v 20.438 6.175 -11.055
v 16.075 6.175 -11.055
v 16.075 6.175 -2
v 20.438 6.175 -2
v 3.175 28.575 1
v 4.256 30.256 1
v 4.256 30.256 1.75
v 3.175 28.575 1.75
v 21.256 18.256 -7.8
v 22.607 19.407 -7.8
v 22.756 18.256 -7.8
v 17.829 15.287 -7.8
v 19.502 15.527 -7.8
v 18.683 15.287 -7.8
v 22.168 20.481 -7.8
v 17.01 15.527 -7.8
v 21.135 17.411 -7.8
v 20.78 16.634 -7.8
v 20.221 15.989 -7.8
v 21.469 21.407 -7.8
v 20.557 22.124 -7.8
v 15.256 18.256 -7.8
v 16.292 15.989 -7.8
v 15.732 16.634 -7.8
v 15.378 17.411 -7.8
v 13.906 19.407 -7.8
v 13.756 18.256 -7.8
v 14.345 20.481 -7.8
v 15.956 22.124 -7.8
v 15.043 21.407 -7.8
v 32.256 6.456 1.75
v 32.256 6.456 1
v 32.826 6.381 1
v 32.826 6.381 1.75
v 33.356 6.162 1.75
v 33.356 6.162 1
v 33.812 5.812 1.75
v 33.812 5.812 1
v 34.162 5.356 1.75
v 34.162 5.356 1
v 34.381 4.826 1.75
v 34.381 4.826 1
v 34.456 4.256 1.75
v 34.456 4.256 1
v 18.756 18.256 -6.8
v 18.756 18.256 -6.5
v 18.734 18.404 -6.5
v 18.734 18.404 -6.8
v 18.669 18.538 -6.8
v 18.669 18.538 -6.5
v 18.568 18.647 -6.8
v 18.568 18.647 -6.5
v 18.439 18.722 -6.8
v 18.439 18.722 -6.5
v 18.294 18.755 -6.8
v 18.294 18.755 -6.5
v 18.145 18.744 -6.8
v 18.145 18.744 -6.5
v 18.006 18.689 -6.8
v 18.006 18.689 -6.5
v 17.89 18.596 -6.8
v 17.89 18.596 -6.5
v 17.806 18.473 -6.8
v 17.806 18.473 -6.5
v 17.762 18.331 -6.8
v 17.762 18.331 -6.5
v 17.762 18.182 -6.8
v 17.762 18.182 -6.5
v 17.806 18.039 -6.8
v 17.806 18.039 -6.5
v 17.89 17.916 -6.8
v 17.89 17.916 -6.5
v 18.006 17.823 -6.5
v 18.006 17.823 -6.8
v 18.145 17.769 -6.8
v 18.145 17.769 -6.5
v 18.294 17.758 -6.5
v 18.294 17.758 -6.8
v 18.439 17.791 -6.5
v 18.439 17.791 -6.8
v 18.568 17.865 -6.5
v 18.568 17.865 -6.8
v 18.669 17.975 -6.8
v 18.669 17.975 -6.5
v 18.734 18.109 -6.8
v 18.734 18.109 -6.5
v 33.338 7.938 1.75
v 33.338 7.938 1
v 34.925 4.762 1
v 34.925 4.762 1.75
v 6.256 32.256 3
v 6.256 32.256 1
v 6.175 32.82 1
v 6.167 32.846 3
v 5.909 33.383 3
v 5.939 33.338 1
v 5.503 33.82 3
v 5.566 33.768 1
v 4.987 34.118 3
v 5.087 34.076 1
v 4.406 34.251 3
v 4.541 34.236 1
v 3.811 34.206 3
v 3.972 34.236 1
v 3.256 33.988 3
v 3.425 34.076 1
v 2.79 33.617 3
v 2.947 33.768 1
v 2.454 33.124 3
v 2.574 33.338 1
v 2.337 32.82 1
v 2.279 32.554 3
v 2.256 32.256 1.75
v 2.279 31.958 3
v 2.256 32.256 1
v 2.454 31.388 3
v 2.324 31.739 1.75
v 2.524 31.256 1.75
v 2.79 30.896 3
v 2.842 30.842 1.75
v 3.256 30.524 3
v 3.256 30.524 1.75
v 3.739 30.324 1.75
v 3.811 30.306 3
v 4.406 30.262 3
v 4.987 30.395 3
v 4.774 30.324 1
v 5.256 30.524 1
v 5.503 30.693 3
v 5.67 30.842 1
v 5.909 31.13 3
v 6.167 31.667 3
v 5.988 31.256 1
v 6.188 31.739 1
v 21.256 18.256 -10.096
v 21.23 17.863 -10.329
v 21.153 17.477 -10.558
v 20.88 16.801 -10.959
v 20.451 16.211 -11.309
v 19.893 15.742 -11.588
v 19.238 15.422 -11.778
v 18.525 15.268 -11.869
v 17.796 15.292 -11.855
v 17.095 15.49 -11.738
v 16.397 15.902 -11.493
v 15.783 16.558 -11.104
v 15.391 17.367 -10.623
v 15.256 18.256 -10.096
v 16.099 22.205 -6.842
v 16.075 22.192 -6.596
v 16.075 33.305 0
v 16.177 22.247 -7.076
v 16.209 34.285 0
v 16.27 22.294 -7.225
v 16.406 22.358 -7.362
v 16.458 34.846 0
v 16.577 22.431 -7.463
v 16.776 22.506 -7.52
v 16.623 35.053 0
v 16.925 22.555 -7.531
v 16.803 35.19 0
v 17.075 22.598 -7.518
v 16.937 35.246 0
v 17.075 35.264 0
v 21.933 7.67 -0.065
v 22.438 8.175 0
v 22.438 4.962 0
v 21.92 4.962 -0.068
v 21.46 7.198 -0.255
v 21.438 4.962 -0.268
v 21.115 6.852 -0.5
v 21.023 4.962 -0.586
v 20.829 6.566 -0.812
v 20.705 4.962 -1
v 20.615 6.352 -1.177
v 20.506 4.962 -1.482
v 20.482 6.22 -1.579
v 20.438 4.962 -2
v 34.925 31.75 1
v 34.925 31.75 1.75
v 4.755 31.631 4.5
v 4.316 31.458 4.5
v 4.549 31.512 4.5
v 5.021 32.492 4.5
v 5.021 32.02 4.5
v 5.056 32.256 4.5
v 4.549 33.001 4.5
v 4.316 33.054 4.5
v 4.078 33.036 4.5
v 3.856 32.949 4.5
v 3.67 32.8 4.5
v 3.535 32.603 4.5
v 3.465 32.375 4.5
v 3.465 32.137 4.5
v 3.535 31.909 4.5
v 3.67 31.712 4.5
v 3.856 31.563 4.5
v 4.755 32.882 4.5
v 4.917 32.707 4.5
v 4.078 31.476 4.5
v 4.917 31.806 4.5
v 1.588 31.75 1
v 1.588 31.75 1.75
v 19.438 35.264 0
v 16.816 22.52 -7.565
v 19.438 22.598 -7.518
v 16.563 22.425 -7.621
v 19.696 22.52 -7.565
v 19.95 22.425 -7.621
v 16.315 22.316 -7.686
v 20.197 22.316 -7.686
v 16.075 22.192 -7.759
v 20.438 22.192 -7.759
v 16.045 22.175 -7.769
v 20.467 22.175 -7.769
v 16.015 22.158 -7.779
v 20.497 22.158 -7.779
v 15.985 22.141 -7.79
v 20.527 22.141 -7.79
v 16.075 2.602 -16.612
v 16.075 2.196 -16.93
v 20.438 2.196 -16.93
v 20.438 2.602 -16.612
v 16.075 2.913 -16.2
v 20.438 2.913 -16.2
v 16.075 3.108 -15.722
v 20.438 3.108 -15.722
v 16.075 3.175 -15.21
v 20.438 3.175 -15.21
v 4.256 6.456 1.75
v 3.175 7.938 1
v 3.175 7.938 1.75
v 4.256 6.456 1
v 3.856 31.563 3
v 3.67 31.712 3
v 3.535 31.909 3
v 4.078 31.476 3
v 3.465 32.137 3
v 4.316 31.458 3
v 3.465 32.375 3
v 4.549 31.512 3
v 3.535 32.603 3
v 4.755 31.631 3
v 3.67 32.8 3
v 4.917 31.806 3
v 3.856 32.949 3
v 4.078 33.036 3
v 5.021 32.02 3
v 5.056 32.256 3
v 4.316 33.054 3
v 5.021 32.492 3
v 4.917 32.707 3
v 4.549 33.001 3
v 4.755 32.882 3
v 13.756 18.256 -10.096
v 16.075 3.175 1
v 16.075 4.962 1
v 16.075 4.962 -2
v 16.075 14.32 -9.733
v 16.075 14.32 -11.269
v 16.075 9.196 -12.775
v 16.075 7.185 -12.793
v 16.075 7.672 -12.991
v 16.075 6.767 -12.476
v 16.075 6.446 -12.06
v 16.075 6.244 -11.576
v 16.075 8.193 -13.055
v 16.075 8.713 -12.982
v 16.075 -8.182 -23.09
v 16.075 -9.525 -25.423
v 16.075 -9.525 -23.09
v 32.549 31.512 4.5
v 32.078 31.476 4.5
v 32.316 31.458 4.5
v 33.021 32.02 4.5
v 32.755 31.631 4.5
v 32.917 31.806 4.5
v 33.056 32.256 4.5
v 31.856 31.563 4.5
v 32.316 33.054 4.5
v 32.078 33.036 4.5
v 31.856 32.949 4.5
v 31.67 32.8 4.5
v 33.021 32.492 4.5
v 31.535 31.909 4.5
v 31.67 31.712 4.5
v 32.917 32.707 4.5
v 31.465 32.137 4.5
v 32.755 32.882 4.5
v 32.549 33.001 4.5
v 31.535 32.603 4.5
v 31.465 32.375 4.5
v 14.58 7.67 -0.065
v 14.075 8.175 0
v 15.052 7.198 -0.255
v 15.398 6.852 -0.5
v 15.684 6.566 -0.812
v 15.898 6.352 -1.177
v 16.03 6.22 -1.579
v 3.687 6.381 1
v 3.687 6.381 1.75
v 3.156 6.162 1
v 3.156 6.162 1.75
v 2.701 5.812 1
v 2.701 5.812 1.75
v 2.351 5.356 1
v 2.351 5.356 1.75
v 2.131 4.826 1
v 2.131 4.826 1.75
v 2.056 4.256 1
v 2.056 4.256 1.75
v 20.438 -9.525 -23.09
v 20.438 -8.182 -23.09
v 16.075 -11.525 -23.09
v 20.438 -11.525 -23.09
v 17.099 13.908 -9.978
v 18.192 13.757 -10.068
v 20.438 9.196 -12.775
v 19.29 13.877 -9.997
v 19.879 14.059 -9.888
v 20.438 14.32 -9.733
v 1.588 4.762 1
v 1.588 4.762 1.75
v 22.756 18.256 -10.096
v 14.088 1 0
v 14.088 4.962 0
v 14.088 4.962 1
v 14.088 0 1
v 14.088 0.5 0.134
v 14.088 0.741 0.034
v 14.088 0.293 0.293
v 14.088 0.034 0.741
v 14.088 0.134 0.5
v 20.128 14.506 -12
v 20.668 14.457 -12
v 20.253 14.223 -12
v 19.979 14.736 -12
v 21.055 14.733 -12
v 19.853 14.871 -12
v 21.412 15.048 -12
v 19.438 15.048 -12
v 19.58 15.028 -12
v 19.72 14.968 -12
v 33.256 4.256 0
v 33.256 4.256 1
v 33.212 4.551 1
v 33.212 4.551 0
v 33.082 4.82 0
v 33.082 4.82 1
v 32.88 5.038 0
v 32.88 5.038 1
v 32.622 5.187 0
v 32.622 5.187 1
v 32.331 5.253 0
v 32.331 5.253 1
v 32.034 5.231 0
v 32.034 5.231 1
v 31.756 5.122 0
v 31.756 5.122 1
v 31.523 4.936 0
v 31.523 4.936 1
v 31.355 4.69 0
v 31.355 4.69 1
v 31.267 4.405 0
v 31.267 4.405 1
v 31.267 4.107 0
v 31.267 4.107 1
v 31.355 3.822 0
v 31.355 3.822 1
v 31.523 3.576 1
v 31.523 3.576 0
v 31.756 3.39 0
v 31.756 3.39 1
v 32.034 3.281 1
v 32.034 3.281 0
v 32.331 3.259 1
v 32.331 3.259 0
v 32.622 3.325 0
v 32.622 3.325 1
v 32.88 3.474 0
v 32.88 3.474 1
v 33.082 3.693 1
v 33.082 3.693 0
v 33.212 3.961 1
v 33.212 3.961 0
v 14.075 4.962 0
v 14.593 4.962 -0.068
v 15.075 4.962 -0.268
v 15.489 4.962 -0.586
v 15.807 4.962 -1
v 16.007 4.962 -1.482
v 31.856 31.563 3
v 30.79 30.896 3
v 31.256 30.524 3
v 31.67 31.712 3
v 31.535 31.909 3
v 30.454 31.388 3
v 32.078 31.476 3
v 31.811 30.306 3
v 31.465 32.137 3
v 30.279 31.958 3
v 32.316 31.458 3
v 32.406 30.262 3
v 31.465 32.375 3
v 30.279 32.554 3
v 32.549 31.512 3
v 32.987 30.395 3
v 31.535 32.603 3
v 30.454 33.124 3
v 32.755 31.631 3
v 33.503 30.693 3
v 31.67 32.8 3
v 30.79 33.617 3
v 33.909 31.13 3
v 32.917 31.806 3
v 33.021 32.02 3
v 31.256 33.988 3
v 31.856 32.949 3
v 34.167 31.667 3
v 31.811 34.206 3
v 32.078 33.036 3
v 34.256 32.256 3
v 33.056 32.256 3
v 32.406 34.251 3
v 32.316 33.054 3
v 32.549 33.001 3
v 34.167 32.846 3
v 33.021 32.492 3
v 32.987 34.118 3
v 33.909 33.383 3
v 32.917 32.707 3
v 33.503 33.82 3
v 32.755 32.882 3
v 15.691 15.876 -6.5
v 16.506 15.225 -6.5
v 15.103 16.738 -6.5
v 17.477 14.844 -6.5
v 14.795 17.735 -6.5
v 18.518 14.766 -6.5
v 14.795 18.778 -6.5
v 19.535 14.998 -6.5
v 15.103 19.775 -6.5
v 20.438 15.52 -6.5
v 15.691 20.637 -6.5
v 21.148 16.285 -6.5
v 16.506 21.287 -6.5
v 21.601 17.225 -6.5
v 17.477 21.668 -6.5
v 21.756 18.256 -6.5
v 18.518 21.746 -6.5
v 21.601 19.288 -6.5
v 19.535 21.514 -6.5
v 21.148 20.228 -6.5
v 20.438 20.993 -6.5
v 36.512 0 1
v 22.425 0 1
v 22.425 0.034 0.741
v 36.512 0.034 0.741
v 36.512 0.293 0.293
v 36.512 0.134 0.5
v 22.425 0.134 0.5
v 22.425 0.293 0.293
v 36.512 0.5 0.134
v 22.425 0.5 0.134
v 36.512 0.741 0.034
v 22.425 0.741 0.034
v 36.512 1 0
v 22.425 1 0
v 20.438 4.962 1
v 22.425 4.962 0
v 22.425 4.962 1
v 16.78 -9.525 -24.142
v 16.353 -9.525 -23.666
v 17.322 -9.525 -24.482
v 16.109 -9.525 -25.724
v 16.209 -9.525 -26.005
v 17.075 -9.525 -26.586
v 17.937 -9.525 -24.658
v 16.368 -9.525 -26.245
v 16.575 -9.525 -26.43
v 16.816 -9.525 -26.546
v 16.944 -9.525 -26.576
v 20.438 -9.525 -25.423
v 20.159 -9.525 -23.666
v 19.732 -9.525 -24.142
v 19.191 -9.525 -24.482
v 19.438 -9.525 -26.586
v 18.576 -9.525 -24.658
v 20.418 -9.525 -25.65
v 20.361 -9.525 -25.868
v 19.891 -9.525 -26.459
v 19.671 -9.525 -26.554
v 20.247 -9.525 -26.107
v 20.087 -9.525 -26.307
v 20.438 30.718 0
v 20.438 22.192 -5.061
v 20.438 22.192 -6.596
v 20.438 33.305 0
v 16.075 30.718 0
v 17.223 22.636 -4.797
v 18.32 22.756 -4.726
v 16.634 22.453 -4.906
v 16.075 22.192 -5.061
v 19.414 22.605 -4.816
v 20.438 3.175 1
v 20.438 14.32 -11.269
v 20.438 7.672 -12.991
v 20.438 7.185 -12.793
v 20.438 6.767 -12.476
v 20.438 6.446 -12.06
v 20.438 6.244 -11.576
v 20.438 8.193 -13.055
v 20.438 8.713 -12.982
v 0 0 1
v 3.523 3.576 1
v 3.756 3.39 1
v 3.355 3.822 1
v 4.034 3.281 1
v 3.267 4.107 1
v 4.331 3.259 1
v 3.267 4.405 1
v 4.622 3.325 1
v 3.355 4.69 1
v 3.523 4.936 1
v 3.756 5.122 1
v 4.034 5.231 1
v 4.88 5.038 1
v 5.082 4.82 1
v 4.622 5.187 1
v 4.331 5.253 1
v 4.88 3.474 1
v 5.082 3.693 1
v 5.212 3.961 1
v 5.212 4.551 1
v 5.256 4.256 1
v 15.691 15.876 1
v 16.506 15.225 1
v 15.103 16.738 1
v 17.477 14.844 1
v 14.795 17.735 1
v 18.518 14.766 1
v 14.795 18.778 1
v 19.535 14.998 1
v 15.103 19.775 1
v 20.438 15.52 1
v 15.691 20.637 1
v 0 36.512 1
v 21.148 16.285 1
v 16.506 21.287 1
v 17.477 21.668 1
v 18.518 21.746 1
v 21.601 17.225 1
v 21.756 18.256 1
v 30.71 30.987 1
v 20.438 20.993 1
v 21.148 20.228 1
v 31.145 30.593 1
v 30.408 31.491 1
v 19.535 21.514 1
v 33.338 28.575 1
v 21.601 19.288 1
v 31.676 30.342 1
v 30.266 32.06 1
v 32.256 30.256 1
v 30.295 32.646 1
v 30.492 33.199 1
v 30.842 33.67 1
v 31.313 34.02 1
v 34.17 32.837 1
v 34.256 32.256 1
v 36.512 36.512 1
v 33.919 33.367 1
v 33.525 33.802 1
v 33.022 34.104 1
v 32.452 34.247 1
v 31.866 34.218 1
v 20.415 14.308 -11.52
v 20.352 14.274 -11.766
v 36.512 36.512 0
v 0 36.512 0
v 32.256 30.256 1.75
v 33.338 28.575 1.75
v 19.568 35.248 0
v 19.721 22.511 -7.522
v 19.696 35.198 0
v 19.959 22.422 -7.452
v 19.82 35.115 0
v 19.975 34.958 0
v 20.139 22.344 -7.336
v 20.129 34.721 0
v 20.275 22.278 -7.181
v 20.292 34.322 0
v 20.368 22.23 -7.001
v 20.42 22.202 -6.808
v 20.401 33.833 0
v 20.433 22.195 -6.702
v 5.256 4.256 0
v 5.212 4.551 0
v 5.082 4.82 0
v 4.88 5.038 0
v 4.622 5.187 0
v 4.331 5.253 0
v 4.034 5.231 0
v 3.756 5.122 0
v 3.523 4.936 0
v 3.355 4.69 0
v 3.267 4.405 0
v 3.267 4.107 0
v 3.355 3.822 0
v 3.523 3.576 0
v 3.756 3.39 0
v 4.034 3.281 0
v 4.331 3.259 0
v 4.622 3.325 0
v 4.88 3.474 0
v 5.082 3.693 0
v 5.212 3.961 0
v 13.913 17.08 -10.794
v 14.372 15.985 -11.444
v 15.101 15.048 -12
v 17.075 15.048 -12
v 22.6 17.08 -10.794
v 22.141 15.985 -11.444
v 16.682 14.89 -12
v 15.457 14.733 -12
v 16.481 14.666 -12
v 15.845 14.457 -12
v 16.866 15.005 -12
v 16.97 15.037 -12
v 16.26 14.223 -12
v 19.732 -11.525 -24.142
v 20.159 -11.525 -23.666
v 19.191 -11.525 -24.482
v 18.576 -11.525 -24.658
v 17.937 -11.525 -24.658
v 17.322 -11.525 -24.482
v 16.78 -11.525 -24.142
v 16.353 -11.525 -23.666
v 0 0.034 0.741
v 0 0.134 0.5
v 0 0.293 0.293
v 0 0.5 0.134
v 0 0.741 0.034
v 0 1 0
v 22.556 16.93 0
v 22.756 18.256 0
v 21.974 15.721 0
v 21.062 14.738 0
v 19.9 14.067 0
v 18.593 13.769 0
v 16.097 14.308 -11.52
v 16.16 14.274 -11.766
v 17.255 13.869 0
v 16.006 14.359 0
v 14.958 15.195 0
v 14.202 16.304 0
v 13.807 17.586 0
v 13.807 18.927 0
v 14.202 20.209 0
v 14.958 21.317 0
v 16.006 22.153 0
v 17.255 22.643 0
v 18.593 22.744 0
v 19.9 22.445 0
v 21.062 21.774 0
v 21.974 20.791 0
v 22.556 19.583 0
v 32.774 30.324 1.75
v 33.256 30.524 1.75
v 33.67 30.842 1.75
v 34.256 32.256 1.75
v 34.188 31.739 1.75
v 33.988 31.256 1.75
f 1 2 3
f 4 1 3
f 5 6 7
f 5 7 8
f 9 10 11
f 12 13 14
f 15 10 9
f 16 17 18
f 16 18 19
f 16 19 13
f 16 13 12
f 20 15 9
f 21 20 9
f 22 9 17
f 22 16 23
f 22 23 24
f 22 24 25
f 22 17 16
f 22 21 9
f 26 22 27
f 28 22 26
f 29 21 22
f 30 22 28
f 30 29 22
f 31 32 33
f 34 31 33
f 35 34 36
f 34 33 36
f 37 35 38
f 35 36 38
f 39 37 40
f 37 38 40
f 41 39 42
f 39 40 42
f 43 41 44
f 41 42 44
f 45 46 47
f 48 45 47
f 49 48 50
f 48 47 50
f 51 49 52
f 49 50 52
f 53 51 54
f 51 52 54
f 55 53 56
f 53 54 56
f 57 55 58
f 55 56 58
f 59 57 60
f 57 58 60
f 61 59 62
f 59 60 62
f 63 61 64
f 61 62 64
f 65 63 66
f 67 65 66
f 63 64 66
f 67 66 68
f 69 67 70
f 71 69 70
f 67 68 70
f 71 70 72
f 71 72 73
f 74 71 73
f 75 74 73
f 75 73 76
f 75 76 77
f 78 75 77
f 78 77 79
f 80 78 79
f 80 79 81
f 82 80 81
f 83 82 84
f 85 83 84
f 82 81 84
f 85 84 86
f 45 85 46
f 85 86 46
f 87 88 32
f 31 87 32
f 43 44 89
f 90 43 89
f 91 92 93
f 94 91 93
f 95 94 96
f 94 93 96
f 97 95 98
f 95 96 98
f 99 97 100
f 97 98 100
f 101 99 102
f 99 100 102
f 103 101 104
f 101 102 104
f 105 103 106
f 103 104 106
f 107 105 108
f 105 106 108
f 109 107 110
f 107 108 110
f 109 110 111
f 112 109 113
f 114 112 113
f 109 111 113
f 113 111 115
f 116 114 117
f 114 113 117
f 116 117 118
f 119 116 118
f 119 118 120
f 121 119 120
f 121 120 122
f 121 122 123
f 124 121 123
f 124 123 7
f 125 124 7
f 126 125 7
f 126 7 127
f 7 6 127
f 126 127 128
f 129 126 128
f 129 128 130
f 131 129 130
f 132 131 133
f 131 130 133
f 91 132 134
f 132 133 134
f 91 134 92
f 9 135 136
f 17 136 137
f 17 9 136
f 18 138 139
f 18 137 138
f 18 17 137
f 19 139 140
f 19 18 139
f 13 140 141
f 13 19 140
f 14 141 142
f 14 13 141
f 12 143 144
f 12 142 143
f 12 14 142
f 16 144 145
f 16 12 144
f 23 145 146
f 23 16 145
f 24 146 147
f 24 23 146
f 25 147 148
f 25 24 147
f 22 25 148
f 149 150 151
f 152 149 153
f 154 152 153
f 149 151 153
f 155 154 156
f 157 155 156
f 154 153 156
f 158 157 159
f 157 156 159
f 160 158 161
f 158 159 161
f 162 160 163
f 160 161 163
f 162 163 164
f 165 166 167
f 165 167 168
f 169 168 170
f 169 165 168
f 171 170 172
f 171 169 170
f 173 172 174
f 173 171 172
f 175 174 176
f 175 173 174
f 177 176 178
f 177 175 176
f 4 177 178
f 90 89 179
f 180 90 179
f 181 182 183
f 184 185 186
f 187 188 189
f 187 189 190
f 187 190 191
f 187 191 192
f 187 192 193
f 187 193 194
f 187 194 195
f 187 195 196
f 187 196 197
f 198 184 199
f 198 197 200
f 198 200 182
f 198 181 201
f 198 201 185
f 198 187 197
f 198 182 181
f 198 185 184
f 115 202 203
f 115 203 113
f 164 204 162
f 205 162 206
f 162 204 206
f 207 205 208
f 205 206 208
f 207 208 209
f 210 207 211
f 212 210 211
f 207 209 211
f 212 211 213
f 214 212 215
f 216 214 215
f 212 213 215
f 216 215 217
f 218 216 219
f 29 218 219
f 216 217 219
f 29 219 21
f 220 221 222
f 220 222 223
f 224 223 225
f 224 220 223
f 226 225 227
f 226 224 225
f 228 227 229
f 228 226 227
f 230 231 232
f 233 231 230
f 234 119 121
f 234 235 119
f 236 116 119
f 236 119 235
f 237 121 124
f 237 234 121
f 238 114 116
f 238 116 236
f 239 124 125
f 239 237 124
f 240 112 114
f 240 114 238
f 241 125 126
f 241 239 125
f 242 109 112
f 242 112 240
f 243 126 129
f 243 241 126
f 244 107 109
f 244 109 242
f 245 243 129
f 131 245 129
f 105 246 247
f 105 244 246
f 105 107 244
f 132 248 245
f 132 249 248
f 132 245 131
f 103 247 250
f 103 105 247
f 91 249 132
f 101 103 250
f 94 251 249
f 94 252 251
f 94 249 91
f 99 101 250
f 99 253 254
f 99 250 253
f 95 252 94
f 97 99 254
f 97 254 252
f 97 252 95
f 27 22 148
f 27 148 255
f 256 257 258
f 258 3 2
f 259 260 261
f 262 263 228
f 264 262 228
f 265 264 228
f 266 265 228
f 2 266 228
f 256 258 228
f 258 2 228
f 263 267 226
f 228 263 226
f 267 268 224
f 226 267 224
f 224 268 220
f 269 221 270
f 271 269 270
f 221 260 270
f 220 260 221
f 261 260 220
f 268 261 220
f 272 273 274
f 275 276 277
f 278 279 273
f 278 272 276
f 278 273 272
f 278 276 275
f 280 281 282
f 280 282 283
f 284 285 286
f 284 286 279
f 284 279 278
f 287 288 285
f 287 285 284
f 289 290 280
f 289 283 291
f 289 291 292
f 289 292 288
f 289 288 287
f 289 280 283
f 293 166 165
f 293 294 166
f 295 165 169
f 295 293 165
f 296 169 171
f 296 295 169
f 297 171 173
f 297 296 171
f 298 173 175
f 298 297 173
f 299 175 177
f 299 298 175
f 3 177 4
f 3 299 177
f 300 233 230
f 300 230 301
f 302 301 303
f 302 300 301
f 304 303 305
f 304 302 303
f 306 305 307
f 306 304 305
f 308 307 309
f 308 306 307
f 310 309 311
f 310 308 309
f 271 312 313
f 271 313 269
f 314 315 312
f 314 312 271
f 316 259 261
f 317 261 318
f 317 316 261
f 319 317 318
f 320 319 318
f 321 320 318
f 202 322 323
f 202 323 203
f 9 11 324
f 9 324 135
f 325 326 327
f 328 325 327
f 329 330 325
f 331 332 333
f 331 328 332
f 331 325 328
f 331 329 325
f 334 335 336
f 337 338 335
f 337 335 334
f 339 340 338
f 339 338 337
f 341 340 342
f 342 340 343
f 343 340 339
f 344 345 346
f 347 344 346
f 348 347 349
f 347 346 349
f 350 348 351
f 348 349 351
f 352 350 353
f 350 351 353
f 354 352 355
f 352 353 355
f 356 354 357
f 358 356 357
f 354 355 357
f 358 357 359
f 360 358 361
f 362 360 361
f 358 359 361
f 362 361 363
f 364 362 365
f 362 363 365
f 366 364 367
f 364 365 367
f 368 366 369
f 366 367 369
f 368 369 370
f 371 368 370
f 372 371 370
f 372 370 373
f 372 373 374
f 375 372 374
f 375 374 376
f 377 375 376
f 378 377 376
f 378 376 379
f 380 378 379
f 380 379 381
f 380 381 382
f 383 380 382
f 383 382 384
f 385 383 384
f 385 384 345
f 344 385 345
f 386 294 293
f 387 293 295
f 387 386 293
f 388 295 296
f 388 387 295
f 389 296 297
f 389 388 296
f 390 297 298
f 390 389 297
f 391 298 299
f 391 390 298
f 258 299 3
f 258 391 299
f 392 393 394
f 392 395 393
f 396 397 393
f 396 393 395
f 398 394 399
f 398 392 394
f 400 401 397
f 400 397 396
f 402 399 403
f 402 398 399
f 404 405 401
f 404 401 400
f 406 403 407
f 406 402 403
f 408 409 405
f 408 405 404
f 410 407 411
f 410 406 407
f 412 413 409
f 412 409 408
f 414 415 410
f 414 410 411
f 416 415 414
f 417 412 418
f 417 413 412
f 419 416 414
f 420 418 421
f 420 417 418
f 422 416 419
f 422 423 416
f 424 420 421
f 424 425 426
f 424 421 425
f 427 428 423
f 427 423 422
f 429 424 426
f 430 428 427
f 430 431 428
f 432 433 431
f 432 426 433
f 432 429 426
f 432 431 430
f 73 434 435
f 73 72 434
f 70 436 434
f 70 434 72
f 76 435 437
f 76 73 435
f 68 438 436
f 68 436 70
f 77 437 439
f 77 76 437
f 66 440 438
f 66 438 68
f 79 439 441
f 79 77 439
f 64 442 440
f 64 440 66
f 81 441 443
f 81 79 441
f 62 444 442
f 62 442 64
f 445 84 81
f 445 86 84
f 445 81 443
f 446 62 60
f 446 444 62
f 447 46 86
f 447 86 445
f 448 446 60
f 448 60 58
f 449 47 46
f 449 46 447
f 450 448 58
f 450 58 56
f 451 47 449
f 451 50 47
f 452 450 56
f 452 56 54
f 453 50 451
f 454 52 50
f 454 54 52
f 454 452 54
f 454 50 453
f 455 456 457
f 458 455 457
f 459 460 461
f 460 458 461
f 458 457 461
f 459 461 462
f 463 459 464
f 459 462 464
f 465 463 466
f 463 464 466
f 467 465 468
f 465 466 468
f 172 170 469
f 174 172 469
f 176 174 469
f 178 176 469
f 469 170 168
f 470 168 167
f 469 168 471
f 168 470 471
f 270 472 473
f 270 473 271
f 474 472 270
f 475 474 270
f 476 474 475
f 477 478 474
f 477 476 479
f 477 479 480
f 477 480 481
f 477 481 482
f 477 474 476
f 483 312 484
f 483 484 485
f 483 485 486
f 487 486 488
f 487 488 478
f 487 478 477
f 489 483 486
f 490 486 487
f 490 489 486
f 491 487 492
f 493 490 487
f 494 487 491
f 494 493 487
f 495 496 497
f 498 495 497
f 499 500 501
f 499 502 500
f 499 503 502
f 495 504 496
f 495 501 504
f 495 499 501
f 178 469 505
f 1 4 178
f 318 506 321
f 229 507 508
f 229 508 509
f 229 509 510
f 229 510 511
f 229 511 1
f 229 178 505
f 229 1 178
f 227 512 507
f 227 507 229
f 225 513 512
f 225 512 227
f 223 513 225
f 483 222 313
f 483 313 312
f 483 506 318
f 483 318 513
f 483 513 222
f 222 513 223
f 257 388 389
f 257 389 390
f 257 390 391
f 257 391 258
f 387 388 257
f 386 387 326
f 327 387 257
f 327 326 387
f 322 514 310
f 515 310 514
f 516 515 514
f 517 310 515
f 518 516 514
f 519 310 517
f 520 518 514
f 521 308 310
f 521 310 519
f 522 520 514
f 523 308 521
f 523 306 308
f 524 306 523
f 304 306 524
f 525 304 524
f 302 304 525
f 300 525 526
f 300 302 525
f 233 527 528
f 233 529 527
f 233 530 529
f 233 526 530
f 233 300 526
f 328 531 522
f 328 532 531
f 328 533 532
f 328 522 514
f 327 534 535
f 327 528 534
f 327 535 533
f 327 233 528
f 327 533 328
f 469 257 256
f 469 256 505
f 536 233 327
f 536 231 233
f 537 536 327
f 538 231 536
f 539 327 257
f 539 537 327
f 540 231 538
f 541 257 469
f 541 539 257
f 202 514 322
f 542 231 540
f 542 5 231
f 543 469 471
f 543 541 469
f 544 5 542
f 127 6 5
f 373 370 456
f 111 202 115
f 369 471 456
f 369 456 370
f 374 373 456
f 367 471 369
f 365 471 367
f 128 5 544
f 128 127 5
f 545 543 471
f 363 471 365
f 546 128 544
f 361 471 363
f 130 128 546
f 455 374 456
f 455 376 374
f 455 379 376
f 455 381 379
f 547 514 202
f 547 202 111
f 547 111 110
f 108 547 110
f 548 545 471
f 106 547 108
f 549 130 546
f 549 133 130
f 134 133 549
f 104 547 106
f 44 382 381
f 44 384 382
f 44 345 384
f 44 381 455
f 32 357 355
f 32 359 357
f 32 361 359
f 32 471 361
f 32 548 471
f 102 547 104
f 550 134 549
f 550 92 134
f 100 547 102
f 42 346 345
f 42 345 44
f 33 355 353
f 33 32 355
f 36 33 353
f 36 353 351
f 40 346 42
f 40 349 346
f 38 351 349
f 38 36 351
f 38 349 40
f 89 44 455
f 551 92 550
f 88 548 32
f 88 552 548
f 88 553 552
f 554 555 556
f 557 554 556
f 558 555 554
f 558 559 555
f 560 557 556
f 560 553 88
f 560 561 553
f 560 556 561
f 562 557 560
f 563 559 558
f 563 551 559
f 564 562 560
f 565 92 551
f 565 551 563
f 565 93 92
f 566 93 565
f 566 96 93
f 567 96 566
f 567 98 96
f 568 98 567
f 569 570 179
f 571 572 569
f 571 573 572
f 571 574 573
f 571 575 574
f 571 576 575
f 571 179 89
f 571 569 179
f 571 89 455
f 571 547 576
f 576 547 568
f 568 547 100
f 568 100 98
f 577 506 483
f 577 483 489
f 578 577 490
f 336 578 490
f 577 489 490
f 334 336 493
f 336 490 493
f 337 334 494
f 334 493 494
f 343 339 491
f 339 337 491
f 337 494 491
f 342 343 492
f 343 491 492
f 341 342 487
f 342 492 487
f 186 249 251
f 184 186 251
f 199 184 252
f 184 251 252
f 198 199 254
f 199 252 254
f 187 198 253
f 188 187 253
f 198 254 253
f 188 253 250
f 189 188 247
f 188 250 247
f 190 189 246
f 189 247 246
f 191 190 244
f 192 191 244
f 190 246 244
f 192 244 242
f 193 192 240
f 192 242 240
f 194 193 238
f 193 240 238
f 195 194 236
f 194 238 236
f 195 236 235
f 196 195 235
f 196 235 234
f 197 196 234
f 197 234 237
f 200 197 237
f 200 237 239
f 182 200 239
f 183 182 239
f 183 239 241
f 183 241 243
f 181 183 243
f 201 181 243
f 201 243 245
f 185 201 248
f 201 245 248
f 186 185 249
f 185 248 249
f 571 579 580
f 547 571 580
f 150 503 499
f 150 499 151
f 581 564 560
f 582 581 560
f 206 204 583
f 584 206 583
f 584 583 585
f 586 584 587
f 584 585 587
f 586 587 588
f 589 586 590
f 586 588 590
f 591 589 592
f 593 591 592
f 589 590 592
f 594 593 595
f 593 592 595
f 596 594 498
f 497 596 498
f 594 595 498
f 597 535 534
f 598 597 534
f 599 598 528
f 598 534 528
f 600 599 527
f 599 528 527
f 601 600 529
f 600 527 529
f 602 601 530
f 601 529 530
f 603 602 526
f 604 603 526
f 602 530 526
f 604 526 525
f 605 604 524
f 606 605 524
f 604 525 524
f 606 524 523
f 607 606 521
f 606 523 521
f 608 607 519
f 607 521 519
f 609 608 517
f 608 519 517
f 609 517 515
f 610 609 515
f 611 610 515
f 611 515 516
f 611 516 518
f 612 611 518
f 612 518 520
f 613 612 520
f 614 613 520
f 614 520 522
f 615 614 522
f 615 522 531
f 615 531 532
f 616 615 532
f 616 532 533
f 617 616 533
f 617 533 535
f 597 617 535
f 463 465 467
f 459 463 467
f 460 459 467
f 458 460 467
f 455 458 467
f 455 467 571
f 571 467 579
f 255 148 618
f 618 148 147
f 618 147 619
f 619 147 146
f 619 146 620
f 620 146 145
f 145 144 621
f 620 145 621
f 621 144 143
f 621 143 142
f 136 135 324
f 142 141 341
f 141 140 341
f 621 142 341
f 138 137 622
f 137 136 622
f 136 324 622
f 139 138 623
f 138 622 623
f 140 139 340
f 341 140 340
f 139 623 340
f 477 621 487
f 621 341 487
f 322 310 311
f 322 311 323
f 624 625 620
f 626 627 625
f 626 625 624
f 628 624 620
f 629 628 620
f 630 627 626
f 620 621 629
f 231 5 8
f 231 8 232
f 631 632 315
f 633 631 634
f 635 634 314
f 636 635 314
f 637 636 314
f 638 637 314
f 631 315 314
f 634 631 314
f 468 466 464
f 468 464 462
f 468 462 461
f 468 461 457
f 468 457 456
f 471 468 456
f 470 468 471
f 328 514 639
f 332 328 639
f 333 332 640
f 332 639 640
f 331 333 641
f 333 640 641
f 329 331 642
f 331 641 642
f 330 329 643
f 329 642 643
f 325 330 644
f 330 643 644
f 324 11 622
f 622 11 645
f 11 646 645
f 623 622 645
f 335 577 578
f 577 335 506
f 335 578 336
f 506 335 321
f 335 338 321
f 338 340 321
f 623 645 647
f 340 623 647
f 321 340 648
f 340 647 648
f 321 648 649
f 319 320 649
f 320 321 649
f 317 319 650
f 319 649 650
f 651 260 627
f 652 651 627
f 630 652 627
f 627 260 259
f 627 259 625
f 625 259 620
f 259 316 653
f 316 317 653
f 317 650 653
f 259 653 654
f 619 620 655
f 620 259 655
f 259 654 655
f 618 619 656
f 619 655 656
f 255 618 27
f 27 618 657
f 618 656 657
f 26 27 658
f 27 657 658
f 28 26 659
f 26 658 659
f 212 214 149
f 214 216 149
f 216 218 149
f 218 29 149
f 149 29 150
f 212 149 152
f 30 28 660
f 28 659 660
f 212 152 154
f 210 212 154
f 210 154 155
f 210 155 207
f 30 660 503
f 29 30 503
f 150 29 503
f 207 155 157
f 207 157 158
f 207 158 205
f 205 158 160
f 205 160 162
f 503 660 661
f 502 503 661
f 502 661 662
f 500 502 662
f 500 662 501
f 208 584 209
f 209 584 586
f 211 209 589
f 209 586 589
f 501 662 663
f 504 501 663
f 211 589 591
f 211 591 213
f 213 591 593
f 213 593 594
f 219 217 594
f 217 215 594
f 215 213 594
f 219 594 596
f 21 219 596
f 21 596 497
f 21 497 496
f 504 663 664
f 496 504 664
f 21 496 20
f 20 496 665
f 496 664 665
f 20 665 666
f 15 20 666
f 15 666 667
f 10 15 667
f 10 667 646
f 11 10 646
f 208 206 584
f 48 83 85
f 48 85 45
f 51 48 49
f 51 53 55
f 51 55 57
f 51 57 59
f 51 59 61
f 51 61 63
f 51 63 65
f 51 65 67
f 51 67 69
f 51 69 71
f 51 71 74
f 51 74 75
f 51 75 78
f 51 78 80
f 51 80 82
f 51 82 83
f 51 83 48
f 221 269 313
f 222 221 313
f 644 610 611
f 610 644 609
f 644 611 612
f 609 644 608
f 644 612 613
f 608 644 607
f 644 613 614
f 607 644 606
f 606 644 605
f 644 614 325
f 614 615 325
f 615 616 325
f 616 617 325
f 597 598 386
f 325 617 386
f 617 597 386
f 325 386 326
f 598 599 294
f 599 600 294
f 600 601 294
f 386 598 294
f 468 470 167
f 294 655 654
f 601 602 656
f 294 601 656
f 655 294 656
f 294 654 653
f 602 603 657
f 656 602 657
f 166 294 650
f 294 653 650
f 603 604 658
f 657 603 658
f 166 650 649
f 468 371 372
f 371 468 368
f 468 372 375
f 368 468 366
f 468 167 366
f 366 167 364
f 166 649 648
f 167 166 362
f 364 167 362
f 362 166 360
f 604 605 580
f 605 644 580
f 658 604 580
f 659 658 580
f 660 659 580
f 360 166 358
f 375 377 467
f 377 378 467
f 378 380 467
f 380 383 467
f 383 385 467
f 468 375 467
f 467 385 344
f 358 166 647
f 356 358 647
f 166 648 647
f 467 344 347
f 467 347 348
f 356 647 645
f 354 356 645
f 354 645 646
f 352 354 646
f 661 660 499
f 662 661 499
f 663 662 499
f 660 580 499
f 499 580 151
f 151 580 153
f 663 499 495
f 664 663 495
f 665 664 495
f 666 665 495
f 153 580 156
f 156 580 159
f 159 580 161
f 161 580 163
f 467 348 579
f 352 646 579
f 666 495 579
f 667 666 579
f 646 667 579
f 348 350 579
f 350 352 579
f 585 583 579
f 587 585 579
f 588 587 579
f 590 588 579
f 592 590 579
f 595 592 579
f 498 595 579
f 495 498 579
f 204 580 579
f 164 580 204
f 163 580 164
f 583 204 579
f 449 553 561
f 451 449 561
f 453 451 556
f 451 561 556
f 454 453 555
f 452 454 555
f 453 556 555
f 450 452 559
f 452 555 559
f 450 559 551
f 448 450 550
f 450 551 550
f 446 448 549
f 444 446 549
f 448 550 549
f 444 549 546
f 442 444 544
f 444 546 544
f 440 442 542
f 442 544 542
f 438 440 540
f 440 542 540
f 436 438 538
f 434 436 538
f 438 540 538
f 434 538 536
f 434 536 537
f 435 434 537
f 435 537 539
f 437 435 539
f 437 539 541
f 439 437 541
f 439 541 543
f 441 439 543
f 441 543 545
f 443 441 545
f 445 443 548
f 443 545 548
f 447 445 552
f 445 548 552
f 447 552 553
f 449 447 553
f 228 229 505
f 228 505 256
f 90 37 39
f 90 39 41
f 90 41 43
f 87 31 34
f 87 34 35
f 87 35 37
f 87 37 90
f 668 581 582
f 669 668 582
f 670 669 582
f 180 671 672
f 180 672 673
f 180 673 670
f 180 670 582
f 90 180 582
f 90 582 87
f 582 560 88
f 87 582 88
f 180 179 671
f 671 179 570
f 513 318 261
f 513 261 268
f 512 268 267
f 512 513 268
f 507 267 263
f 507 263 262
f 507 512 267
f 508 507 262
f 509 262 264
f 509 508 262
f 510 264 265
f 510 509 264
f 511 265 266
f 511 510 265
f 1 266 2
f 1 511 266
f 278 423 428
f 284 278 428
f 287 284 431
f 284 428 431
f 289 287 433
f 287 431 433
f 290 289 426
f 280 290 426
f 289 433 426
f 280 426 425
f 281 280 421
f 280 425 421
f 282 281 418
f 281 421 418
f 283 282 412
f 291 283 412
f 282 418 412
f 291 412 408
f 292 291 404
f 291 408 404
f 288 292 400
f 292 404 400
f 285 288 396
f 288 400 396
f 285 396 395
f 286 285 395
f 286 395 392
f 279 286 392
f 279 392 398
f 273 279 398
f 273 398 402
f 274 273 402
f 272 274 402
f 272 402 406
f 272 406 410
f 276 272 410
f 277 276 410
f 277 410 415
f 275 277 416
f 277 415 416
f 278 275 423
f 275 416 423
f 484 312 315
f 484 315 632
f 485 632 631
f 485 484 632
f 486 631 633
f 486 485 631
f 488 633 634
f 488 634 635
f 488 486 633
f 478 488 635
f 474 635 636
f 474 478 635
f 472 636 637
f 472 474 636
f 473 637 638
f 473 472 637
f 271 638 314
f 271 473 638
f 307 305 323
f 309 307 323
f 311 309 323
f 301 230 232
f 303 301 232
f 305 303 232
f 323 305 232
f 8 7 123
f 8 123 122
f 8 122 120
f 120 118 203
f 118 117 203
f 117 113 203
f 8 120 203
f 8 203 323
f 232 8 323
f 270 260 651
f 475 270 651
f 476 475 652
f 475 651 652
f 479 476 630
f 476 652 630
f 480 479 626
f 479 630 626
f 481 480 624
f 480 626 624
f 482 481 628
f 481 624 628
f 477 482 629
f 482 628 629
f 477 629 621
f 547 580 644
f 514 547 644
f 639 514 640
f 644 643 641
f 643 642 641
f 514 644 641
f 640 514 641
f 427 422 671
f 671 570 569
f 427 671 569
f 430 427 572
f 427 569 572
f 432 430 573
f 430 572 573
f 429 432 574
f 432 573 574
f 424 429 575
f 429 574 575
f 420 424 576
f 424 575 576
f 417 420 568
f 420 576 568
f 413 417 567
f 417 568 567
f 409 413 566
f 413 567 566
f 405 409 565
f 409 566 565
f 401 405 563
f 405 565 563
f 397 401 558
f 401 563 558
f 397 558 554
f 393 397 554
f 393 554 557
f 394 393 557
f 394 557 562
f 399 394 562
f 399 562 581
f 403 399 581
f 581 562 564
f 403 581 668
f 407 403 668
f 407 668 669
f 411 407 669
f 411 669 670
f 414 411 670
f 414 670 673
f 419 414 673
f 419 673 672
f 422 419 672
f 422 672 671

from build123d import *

# Parameters (mm, degrees)
EXTRUDE1_DEPTH       = 1
SKETCH2_R            = 2.0000000000000036
SKETCH2_R_2          = 2.000000000000001
EXTRUDE2_DEPTH       = 2
EXTRUDE3_DEPTH       = 0.75
SKETCH4_R            = 0.9999999999999981
SKETCH4_R_2          = 0.9999999999999998
EXTRUDE4_DEPTH       = 52.67519049311769
SKETCH5_R            = 0.800000000000003
SKETCH5_R_2          = 0.8000000000000015
EXTRUDE5_DEPTH       = 1.5
EXTRUDE6_DEPTH       = 52.83218413785011
SKETCH7_W            = 4.362500000000001
SKETCH7_H            = 3.0000000000000013
EXTRUDE7_DEPTH       = 19
EXTRUDE8_DEPTH       = 46.95491336625498
EXTRUDE9_DEPTH       = 17
EXTRUDE9_DEPTH_BACK  = 36
SKETCH9_W            = 4.362500000000001
SKETCH9_H            = 2.3206120824820307
SKETCH10_W           = 6.349999999999998
SKETCH10_H           = 3.475000000000003
EXTRUDE10_DEPTH      = 50.80993243420719
SKETCH11_R           = 4.500000000000002
EXTRUDE11_DEPTH      = 12
EXTRUDE12_START      = -4.2
EXTRUDE12_DEPTH      = 4.2
EXTRUDE13_DEPTH      = 4.5
EXTRUDE13_DEPTH_BACK = 50.57488155832686
SKETCH15_R           = 3.4999999999999996
EXTRUDE14_DEPTH      = 7.5
SKETCH16_R           = 0.49999999999999917
EXTRUDE15_DEPTH      = 0.3
EXTRUDE16_DEPTH      = 2
EXTRUDE17_DEPTH      = 5
EXTRUDE18_DEPTH      = 50.574881558326865
FILLET2_R            = 1
FILLET3_R            = 2
EXTRUDE19_DEPTH      = 4.3625


with BuildPart() as part:
    # Sketch1 → Extrude1 (new body)
    with BuildSketch(Plane.XY):
        Polygon((0, 0), (36.5125, 0), (36.512499999999996, 36.512499999999996), (0, 36.5125), align=None)
    extrude(amount=EXTRUDE1_DEPTH)

    # Sketch2 → Extrude2 (add)
    with BuildSketch(Plane.XY.offset(1)):
        with Locations((32.25625, 32.25625)):
            Circle(SKETCH2_R)
        with Locations((4.25625, 32.25625)):
            Circle(SKETCH2_R_2)
    extrude(amount=EXTRUDE2_DEPTH)

    # Sketch3 → Extrude3 (add)
    with BuildSketch(Plane.XY.offset(1)):
        with BuildLine():
            Line((1.5875, 4.762499999999999), (1.5875, 31.75))
            Line((1.5875, 31.75), (2.256249999999998, 32.25625))
            Line((2.256249999999998, 32.25625), (4.25625, 30.256249999999998))
            Line((4.25625, 30.256249999999998), (3.175, 28.575))
            Line((3.175, 28.575), (3.175, 7.9375))
            Line((3.175, 7.9375), (4.256250000000003, 6.456250000000007))
            ThreePointArc((4.256250000000003, 6.456250000000007), (2.7006150813895986, 5.811884918610412), (2.0562500000000026, 4.256250000000007))
            Line((2.0562500000000026, 4.256250000000007), (1.5875, 4.762499999999999))
        make_face()
        with BuildLine():
            Line((34.925, 4.762499999999999), (34.925, 31.75))
            Line((34.925, 31.75), (34.25625, 32.25625))
            Line((34.25625, 32.25625), (32.25625, 30.256249999999998))
            Line((32.25625, 30.256249999999998), (33.3375, 28.575))
            Line((33.3375, 28.575), (33.3375, 7.9375))
            Line((33.3375, 7.9375), (32.25625000000001, 6.456249999999997))
            ThreePointArc((32.25625000000001, 6.456249999999997), (33.81188491861041, 5.811884918610402), (34.456250000000004, 4.256249999999998))
            Line((34.456250000000004, 4.256249999999998), (34.925, 4.762499999999999))
        make_face()
    extrude(amount=EXTRUDE3_DEPTH)

    # Sketch4 → Extrude4 (cut, through all)
    with BuildSketch(Plane.XY.offset(1)):
        with Locations((32.25625, 4.256249999999997)):
            Circle(SKETCH4_R)
        with Locations((4.256250000000007, 4.256250000000004)):
            Circle(SKETCH4_R_2)
    extrude(amount=-EXTRUDE4_DEPTH, mode=Mode.SUBTRACT)

    # Sketch5 → Extrude5 (add)
    with BuildSketch(Plane.XY.offset(3)):
        with Locations((32.25625, 32.25625)):
            Circle(SKETCH5_R)
        with Locations((4.25625, 32.25625)):
            Circle(SKETCH5_R_2)
    extrude(amount=EXTRUDE5_DEPTH)

    # Sketch6 → Extrude6 (cut, through all)
    with BuildSketch(Plane(origin=(0, 0, 0), x_dir=(-1, 0, 0), z_dir=(0, 0, -1))):
        Polygon((-22.425, 0), (-22.425, 4.9625), (-20.4375, 4.9625), (-20.4375, 3.175), (-16.075, 3.175), (-16.075, 4.9625), (-14.0875, 4.9625), (-14.0875, 0), align=None)
    extrude(amount=-EXTRUDE6_DEPTH, mode=Mode.SUBTRACT)

    # Sketch7 → Extrude7 (add)
    with BuildSketch(Plane(origin=(0, 0, 0), x_dir=(-1, 0, 0), z_dir=(0, 0, -1))):
        with Locations((-18.25625, 4.675)):
            Rectangle(SKETCH7_W, SKETCH7_H)
    extrude(amount=EXTRUDE7_DEPTH)

    # Sketch8 → Extrude8 (cut, through all)
    with BuildSketch(Plane(origin=(20.4375, 0, 0), x_dir=(0, 0, -1), z_dir=(1, 0, 0))):
        Polygon((19, 4.748611530779532), (19, 0), (11, -9.8e-16), align=None)
    extrude(amount=-EXTRUDE8_DEPTH, mode=Mode.SUBTRACT)

    # Sketch9 → Extrude9 (add, two sides: drawn at the far end of the back side and taken through both)
    with BuildSketch(Plane(origin=(0, -4.828204957496708, -2.8659087167669712), x_dir=(1, 0, 0), z_dir=(0, -0.8599202544016947, -0.5104284044503447)).offset(-EXTRUDE9_DEPTH_BACK)):
        with Locations((18.25625, -16.839693958758986)):
            Rectangle(SKETCH9_W, SKETCH9_H)
    extrude(amount=EXTRUDE9_DEPTH + EXTRUDE9_DEPTH_BACK)

    # Sketch10 → Extrude10 (cut, through all)
    with BuildSketch(Plane(origin=(20.4375, 0, 0), x_dir=(0, 0, -1), z_dir=(1, 0, 0))):
        with Locations((25.4, -11.2625)):
            Rectangle(SKETCH10_W, SKETCH10_H)
    extrude(amount=-EXTRUDE10_DEPTH, mode=Mode.SUBTRACT)

    # Sketch11 → Extrude11 (add)
    with BuildSketch(Plane(origin=(0, 0, 0), x_dir=(-1, 0, 0), z_dir=(0, 0, -1))):
        with Locations(Location((-18.25625, 18.25625, 0), (0, 0, 180))):
            Circle(SKETCH11_R)
    extrude(amount=EXTRUDE11_DEPTH)

    # Sketch12 → Extrude12 (cut)
    with BuildSketch(Plane(origin=(0, 0, -12), x_dir=(-1, 0, 0), z_dir=(0, 0, -1)).offset(EXTRUDE12_START)):
        with BuildLine():
            Line((-22.75625, 18.25625), (-21.25625, 18.25625))
            ThreePointArc((-21.25625, 18.25625), (-18.25625, 15.256250000000001), (-15.256250000000003, 18.25625))
            Line((-15.256250000000003, 18.25625), (-13.756250000000001, 18.25625))
            ThreePointArc((-13.756250000000001, 18.25625), (-18.25625, 22.75625), (-22.75625, 18.25625))
        make_face()
    extrude(amount=EXTRUDE12_DEPTH, mode=Mode.SUBTRACT)

    # Sketch13 → Extrude13 (cut, two sides: drawn at the far end of the back side and taken through both)
    with BuildSketch(Plane.ZY.offset(-16.075).offset(-EXTRUDE13_DEPTH_BACK)):
        Polygon((-6.511482510112533, 24.294581169959557), (-19.744999641447297, 2.000035413908037), (-19.744999641447297, 23.38214880236955), align=None)
    extrude(amount=EXTRUDE13_DEPTH + EXTRUDE13_DEPTH_BACK, mode=Mode.SUBTRACT)

    # Sketch15 → Extrude14 (cut)
    with BuildSketch(Plane.XY.offset(1)):
        with Locations((18.256250000000005, 18.256249999999998)):
            Circle(SKETCH15_R)
    extrude(amount=-EXTRUDE14_DEPTH, mode=Mode.SUBTRACT)

    # Sketch16 → Extrude15 (cut)
    with BuildSketch(Plane.XY.offset(-6.5)):
        with Locations((18.256250000000005, 18.256249999999998)):
            Circle(SKETCH16_R)
    extrude(amount=-EXTRUDE15_DEPTH, mode=Mode.SUBTRACT)



with BuildPart() as body_2:
    # Sketch17 → Extrude16 (new body)
    with BuildSketch(Plane.XZ.offset(9.524999999999999)):
        with BuildLine():
            Line((16.075, -23.090021330000003), (20.43750000000001, -23.090021330000003))
            ThreePointArc((20.43750000000001, -23.090021330000003), (18.256250000000005, -24.680840302005432), (16.075, -23.090021330000003))
        make_face()
    extrude(amount=EXTRUDE16_DEPTH)


with BuildPart() as part_1:
    add(part.part)

    add(body_2.part)  # Extrude17 merges body 2
    # Sketch18 → Extrude17 (add)
    with BuildSketch(Plane.XZ.offset(9.524999999999999)):
        Polygon((20.4375, -26.585989148838085), (20.43750000000001, -23.090021330000003), (16.075, -23.090021330000003), (16.075, -26.585989148838067), align=None)
    extrude(amount=-EXTRUDE17_DEPTH)

    # Sketch19 → Extrude18 (cut, through all)
    with BuildSketch(Plane(origin=(20.4375, 0, 0), x_dir=(0, 0, -1), z_dir=(1, 0, 0))):
        Polygon((19.073875811639994, 3.1306797303903946), (28.233881236807996, -12.301208712443408), (26.987499999999997, 3.175), align=None)
    extrude(amount=-EXTRUDE18_DEPTH, mode=Mode.SUBTRACT)

    # Fillet2
    # the kernel refuses this fillet: 1 mm, written as the material it adds along each edge
    # the kernel refuses this fillet: 1 mm, written as the material it takes off along each edge
    with BuildSketch(Plane(origin=(20.4375, 37.41429579940197, 1.276071011125861), x_dir=(-1, 3.9e-16, -6.6e-16), z_dir=(0, -0.8599202544016947, -0.5104284044503447))) as fillet2_2_piece_1_section:
        with BuildLine():
            CenterArc((FILLET2_R, -FILLET2_R), FILLET2_R, 89.99999999999996, 90.00000000000004)
            Line((-7.6e-16, -FILLET2_R), (0, 0))
            Line((0, 0), (FILLET2_R, 0))
        make_face()
    fillet2_2_piece_1 = extrude(amount=20.201686941576707, mode=Mode.PRIVATE)
    fillet2_2_piece_1 = fillet2_2_piece_1 - Plane(origin=(18.25625, 18.25625, -3.719487520813402), x_dir=(1, 1.2e-16, 0), z_dir=(0, 0, 1)) * Cylinder(4.500000000000002, 45, mode=Mode.PRIVATE)
    fillet2_2_piece_1 = split(fillet2_2_piece_1, bisect_by=Plane(origin=(20.212177439372237, 28.569917833815104, 0), z_dir=(0, 0, -1)), keep=Keep.TOP, mode=Mode.PRIVATE)
    add(fillet2_2_piece_1, mode=Mode.SUBTRACT)
    with BuildSketch(Plane(origin=(20.4375, -11.674800636004225, -27.86206015996393), x_dir=(0, -0.5104284044503445, 0.8599202544016947), z_dir=(0, 0.8599202544016948, 0.5104284044503447))) as fillet2_2_piece_2_section:
        with BuildLine():
            CenterArc((FILLET2_R, -FILLET2_R), FILLET2_R, 90, 90)
            Line((-2.15e-15, -FILLET2_R), (0, 0))
            Line((0, 0), (FILLET2_R, 0))
        make_face()
    fillet2_2_piece_2 = extrude(amount=33.575974655142886, mode=Mode.PRIVATE)
    fillet2_2_piece_2 = split(fillet2_2_piece_2, bisect_by=Plane(origin=(20.21436970343455, 2.314941596078876, -12), z_dir=(0, 0, -1)), keep=Keep.TOP, mode=Mode.PRIVATE)
    add(fillet2_2_piece_2, mode=Mode.SUBTRACT)
    with BuildSketch(Plane(origin=(20.4375, -11.674800636004225, -27.86206015996393), x_dir=(0, -0.5104284044503445, 0.8599202544016947), z_dir=(0, 0.8599202544016948, 0.5104284044503447))) as fillet2_2_piece_3_section:
        with BuildLine():
            CenterArc((FILLET2_R, -FILLET2_R), FILLET2_R, 90, 90)
            Line((-2.15e-15, -FILLET2_R), (0, 0))
            Line((0, 0), (FILLET2_R, 0))
        make_face()
    fillet2_2_piece_3 = extrude(amount=33.575974655142886, mode=Mode.PRIVATE)
    fillet2_2_piece_3 = fillet2_2_piece_3 - Plane(origin=(18.25625, 18.25625, -11.853054831644428), x_dir=(1, 1.2e-16, 0), z_dir=(0, 0, 1)) * Cylinder(4.500000000000002, 72, mode=Mode.PRIVATE)
    add(fillet2_2_piece_3, mode=Mode.SUBTRACT)
    with BuildSketch(Plane(origin=(16.075, 37.41429579940197, 1.276071011125861), x_dir=(1, 3.9e-16, -6.6e-16), z_dir=(0, -0.8599202544016947, -0.5104284044503447))) as fillet2_2_piece_4_section:
        with BuildLine():
            CenterArc((FILLET2_R, FILLET2_R), FILLET2_R, 180, 90.00000000000006)
            Line((-7.6e-16, FILLET2_R), (0, 0))
            Line((0, 0), (FILLET2_R, 0))
        make_face()
    fillet2_2_piece_4 = extrude(amount=20.201686941576707, mode=Mode.PRIVATE)
    fillet2_2_piece_4 = fillet2_2_piece_4 - Plane(origin=(18.25625, 18.25625, -3.71949003584698), x_dir=(1, 1.2e-16, 0), z_dir=(0, 0, 1)) * Cylinder(4.500000000000002, 45, mode=Mode.PRIVATE)
    fillet2_2_piece_4 = split(fillet2_2_piece_4, bisect_by=Plane(origin=(16.300322795564288, 28.56991314804096, 0), z_dir=(0, 0, -1)), keep=Keep.TOP, mode=Mode.PRIVATE)
    add(fillet2_2_piece_4, mode=Mode.SUBTRACT)
    with BuildSketch(Plane(origin=(16.075, 17.197860031231095, -10.723928988874135), x_dir=(0, -0.5104284044503445, 0.8599202544016947), z_dir=(0, -0.8599202544016948, -0.5104284044503447))) as fillet2_2_piece_5_section:
        with BuildLine():
            CenterArc((FILLET2_R, -FILLET2_R), FILLET2_R, 90, 90)
            Line((-2.9e-16, -FILLET2_R), (0, 0))
            Line((0, 0), (FILLET2_R, 0))
        make_face()
    fillet2_2_piece_5 = extrude(amount=33.5759746551429, mode=Mode.PRIVATE)
    fillet2_2_piece_5 = split(fillet2_2_piece_5, bisect_by=Plane(origin=(16.399463784438982, 14.506186202544315, -12), z_dir=(0, 0, -1)), keep=Keep.TOP, mode=Mode.PRIVATE)
    add(fillet2_2_piece_5, mode=Mode.SUBTRACT)
    with BuildSketch(Plane(origin=(16.075, 17.197860031231095, -10.723928988874135), x_dir=(0, -0.5104284044503445, 0.8599202544016947), z_dir=(0, -0.8599202544016948, -0.5104284044503447))) as fillet2_2_piece_6_section:
        with BuildLine():
            CenterArc((FILLET2_R, -FILLET2_R), FILLET2_R, 90, 90)
            Line((-2.9e-16, -FILLET2_R), (0, 0))
            Line((0, 0), (FILLET2_R, 0))
        make_face()
    fillet2_2_piece_6 = extrude(amount=33.5759746551429, mode=Mode.PRIVATE)
    fillet2_2_piece_6 = fillet2_2_piece_6 - Plane(origin=(18.25625, 18.25625, -11.853054833536454), x_dir=(1, 1.2e-16, 0), z_dir=(0, 0, 1)) * Cylinder(4.500000000000002, 72, mode=Mode.PRIVATE)
    add(fillet2_2_piece_6, mode=Mode.SUBTRACT)
    with BuildSketch(Plane(origin=(-2.5000000000000004, 0, 0), x_dir=(0, 0, 1), z_dir=(1, 0, 0)), Plane(origin=(19.925, 0, 0), x_dir=(0, 0, 1), z_dir=(1, 0, 0))) as fillet2_2_piece_7:
        with BuildLine():
            CenterArc((FILLET2_R, -FILLET2_R), FILLET2_R, 90, 90)
            Line((-1.1e-16, -FILLET2_R), (0, 0))
            Line((0, 0), (FILLET2_R, 0))
        make_face()
    extrude(amount=19.087500000000002, mode=Mode.SUBTRACT)

    # Fillet3
    # the kernel refuses this fillet: 2 mm, written as the material it adds along each edge
    with BuildSketch(Plane(origin=(16.075, 4.9625, 0), x_dir=(0, 0, -1), z_dir=(0, 1, 0)), Plane(origin=(20.4375, 6.175, 0), x_dir=(0, 0, -1), z_dir=(0, -1, 0))) as fillet3_piece_1:
        with BuildLine():
            CenterArc((FILLET3_R, FILLET3_R), FILLET3_R, 180, 90)
            Line((-2.2e-16, FILLET3_R), (-FILLET3_R * 0.02, FILLET3_R))
            Line((-FILLET3_R * 0.02, FILLET3_R), (-FILLET3_R * 0.02, -FILLET3_R * 0.02))
            Line((-FILLET3_R * 0.02, -FILLET3_R * 0.02), (FILLET3_R, -FILLET3_R * 0.02))
            Line((FILLET3_R, -FILLET3_R * 0.02), (FILLET3_R, 0))
        make_face()
    extrude(amount=1.2124999999999995)
    with BuildSketch(Plane(origin=(16.075, 6.175, 0), x_dir=(0, 1, 0), z_dir=(1, 0, 0))) as fillet3_piece_2:
        with BuildLine():
            CenterArc((FILLET3_R, -FILLET3_R), FILLET3_R, 90, 90)
            Line((-8.9e-16, -FILLET3_R), (-FILLET3_R * 0.02, -FILLET3_R))
            Line((-FILLET3_R * 0.02, -FILLET3_R), (-FILLET3_R * 0.02, FILLET3_R * 0.02))
            Line((-FILLET3_R * 0.02, FILLET3_R * 0.02), (FILLET3_R, FILLET3_R * 0.02))
            Line((FILLET3_R, FILLET3_R * 0.02), (FILLET3_R, 0))
        make_face()
    extrude(amount=4.362500000000001)
    with BuildSketch(Plane(origin=(16.075, 3.175000000000001, -16.34893196366189), x_dir=(0, -1.17e-15, 1), z_dir=(1, 0, 0))) as fillet3_piece_3:
        with BuildLine():
            CenterArc((FILLET3_R * 0.569322088931, FILLET3_R), FILLET3_R, 210.69236976062953, 59.30763023937038)
            Line((-FILLET3_R * 0.290598165471, FILLET3_R * 0.48957159555), (-FILLET3_R * 0.307796570559, FILLET3_R * 0.479363027461))
            Line((-FILLET3_R * 0.307796570559, FILLET3_R * 0.479363027461), (-FILLET3_R * 0.0113864417786, -FILLET3_R * 0.02))
            Line((-FILLET3_R * 0.0113864417786, -FILLET3_R * 0.02), (FILLET3_R * 0.569322088931, -FILLET3_R * 0.02))
            Line((FILLET3_R * 0.569322088931, -FILLET3_R * 0.02), (FILLET3_R * 0.569322088931, 0))
        make_face()
    extrude(amount=4.362500000000001)
    with BuildSketch(Plane(origin=(20.4375, 6.175000000000001, -14.568202639619555), x_dir=(0, 0.8599202544016946, 0.5104284044503449), z_dir=(-1, 0, 0))) as fillet3_piece_4:
        with BuildLine():
            CenterArc((FILLET3_R * 1.75647497163, -FILLET3_R), FILLET3_R, 90.00000000000006, 120.6923697606295)
            Line((FILLET3_R * 0.896554717224, -FILLET3_R * 1.51042840445), (FILLET3_R * 0.879356312136, -FILLET3_R * 1.52063697254))
            Line((FILLET3_R * 0.879356312136, -FILLET3_R * 1.52063697254), (-FILLET3_R * 0.017198405088, -FILLET3_R * 0.010208568089))
            Line((-FILLET3_R * 0.017198405088, -FILLET3_R * 0.010208568089), (1.4e-16, FILLET3_R * 0.02))
            Line((1.4e-16, FILLET3_R * 0.02), (FILLET3_R * 1.75647497163, FILLET3_R * 0.02))
            Line((FILLET3_R * 1.75647497163, FILLET3_R * 0.02), (FILLET3_R * 1.75647497163, 0))
        make_face()
    extrude(amount=4.362500000000001)
    with BuildSketch(Plane(origin=(16.075, 4.9625, 0), x_dir=(0, 0, -1), z_dir=(0, 1, 0))) as fillet3_piece_5a_section:
        with BuildLine():
            CenterArc((FILLET3_R, FILLET3_R), FILLET3_R, 180, 90)
            Line((-2.2e-16, FILLET3_R), (-FILLET3_R * 0.02, FILLET3_R))
            Line((-FILLET3_R * 0.02, FILLET3_R), (-FILLET3_R * 0.02, -FILLET3_R * 0.02))
            Line((-FILLET3_R * 0.02, -FILLET3_R * 0.02), (FILLET3_R, -FILLET3_R * 0.02))
            Line((FILLET3_R, -FILLET3_R * 0.02), (FILLET3_R, 0))
        make_face()
    fillet3_piece_5a = extrude(amount=6.2125, mode=Mode.PRIVATE)
    fillet3_piece_5a = split(fillet3_piece_5a, bisect_by=Plane(origin=(15.622209771466347, 6.175, -0.45279022853364964), z_dir=(0, 1, 0)), keep=Keep.TOP, mode=Mode.PRIVATE)
    with BuildSketch(Plane(origin=(11.075, 6.175000000000001, 0), x_dir=(0, 1, 0), z_dir=(1, 0, 0))) as fillet3_piece_5b_section:
        with BuildLine():
            CenterArc((FILLET3_R, -FILLET3_R), FILLET3_R, 90, 90)
            Line((0, -FILLET3_R), (-FILLET3_R * 0.02, -FILLET3_R))
            Line((-FILLET3_R * 0.02, -FILLET3_R), (-FILLET3_R * 0.02, FILLET3_R * 0.02))
            Line((-FILLET3_R * 0.02, FILLET3_R * 0.02), (FILLET3_R, FILLET3_R * 0.02))
            Line((FILLET3_R, FILLET3_R * 0.02), (FILLET3_R, 0))
        make_face()
    fillet3_piece_5b = extrude(amount=9.3625, mode=Mode.PRIVATE)
    fillet3_piece_5b = split(fillet3_piece_5b, bisect_by=Plane(origin=(16.075, 6.627790228533651, -0.4527902285336509), z_dir=(-1, 0, 0)), keep=Keep.TOP, mode=Mode.PRIVATE)
    fillet3_piece_5 = fillet3_piece_5a & fillet3_piece_5b
    add(fillet3_piece_5)
    with BuildSketch(Plane(origin=(20.4375, 11.175, 0), x_dir=(0, 0, -1), z_dir=(0, -1, 0))) as fillet3_piece_6a_section:
        with BuildLine():
            CenterArc((FILLET3_R, FILLET3_R), FILLET3_R, 180, 90)
            Line((-2.2e-16, FILLET3_R), (-FILLET3_R * 0.02, FILLET3_R))
            Line((-FILLET3_R * 0.02, FILLET3_R), (-FILLET3_R * 0.02, -FILLET3_R * 0.02))
            Line((-FILLET3_R * 0.02, -FILLET3_R * 0.02), (FILLET3_R, -FILLET3_R * 0.02))
            Line((FILLET3_R, -FILLET3_R * 0.02), (FILLET3_R, 0))
        make_face()
    fillet3_piece_6a = extrude(amount=6.2125, mode=Mode.PRIVATE)
    fillet3_piece_6a = split(fillet3_piece_6a, bisect_by=Plane(origin=(20.89029022853365, 6.175, -0.45279022853364964), z_dir=(0, 1, 0)), keep=Keep.TOP, mode=Mode.PRIVATE)
    with BuildSketch(Plane(origin=(16.075, 6.175, 0), x_dir=(0, 1, 0), z_dir=(1, 0, 0))) as fillet3_piece_6b_section:
        with BuildLine():
            CenterArc((FILLET3_R, -FILLET3_R), FILLET3_R, 90, 90)
            Line((-8.9e-16, -FILLET3_R), (-FILLET3_R * 0.02, -FILLET3_R))
            Line((-FILLET3_R * 0.02, -FILLET3_R), (-FILLET3_R * 0.02, FILLET3_R * 0.02))
            Line((-FILLET3_R * 0.02, FILLET3_R * 0.02), (FILLET3_R, FILLET3_R * 0.02))
            Line((FILLET3_R, FILLET3_R * 0.02), (FILLET3_R, 0))
        make_face()
    fillet3_piece_6b = extrude(amount=9.3625, mode=Mode.PRIVATE)
    fillet3_piece_6b = split(fillet3_piece_6b, bisect_by=Plane(origin=(20.4375, 6.627790228533651, -0.4527902285336507), z_dir=(1, 0, 0)), keep=Keep.TOP, mode=Mode.PRIVATE)
    fillet3_piece_6 = fillet3_piece_6a & fillet3_piece_6b
    add(fillet3_piece_6)

    # Sketch20 → Extrude19 (cut)
    with BuildSketch(Plane.ZY.offset(-16.075)):
        Polygon((0.9999999999999991, 34.74142979383808), (1, 32.40279739081142), (2.0264905965505267, 34.13212915846101), align=None)
    extrude(amount=-EXTRUDE19_DEPTH, mode=Mode.SUBTRACT)


solid = part_1.part
